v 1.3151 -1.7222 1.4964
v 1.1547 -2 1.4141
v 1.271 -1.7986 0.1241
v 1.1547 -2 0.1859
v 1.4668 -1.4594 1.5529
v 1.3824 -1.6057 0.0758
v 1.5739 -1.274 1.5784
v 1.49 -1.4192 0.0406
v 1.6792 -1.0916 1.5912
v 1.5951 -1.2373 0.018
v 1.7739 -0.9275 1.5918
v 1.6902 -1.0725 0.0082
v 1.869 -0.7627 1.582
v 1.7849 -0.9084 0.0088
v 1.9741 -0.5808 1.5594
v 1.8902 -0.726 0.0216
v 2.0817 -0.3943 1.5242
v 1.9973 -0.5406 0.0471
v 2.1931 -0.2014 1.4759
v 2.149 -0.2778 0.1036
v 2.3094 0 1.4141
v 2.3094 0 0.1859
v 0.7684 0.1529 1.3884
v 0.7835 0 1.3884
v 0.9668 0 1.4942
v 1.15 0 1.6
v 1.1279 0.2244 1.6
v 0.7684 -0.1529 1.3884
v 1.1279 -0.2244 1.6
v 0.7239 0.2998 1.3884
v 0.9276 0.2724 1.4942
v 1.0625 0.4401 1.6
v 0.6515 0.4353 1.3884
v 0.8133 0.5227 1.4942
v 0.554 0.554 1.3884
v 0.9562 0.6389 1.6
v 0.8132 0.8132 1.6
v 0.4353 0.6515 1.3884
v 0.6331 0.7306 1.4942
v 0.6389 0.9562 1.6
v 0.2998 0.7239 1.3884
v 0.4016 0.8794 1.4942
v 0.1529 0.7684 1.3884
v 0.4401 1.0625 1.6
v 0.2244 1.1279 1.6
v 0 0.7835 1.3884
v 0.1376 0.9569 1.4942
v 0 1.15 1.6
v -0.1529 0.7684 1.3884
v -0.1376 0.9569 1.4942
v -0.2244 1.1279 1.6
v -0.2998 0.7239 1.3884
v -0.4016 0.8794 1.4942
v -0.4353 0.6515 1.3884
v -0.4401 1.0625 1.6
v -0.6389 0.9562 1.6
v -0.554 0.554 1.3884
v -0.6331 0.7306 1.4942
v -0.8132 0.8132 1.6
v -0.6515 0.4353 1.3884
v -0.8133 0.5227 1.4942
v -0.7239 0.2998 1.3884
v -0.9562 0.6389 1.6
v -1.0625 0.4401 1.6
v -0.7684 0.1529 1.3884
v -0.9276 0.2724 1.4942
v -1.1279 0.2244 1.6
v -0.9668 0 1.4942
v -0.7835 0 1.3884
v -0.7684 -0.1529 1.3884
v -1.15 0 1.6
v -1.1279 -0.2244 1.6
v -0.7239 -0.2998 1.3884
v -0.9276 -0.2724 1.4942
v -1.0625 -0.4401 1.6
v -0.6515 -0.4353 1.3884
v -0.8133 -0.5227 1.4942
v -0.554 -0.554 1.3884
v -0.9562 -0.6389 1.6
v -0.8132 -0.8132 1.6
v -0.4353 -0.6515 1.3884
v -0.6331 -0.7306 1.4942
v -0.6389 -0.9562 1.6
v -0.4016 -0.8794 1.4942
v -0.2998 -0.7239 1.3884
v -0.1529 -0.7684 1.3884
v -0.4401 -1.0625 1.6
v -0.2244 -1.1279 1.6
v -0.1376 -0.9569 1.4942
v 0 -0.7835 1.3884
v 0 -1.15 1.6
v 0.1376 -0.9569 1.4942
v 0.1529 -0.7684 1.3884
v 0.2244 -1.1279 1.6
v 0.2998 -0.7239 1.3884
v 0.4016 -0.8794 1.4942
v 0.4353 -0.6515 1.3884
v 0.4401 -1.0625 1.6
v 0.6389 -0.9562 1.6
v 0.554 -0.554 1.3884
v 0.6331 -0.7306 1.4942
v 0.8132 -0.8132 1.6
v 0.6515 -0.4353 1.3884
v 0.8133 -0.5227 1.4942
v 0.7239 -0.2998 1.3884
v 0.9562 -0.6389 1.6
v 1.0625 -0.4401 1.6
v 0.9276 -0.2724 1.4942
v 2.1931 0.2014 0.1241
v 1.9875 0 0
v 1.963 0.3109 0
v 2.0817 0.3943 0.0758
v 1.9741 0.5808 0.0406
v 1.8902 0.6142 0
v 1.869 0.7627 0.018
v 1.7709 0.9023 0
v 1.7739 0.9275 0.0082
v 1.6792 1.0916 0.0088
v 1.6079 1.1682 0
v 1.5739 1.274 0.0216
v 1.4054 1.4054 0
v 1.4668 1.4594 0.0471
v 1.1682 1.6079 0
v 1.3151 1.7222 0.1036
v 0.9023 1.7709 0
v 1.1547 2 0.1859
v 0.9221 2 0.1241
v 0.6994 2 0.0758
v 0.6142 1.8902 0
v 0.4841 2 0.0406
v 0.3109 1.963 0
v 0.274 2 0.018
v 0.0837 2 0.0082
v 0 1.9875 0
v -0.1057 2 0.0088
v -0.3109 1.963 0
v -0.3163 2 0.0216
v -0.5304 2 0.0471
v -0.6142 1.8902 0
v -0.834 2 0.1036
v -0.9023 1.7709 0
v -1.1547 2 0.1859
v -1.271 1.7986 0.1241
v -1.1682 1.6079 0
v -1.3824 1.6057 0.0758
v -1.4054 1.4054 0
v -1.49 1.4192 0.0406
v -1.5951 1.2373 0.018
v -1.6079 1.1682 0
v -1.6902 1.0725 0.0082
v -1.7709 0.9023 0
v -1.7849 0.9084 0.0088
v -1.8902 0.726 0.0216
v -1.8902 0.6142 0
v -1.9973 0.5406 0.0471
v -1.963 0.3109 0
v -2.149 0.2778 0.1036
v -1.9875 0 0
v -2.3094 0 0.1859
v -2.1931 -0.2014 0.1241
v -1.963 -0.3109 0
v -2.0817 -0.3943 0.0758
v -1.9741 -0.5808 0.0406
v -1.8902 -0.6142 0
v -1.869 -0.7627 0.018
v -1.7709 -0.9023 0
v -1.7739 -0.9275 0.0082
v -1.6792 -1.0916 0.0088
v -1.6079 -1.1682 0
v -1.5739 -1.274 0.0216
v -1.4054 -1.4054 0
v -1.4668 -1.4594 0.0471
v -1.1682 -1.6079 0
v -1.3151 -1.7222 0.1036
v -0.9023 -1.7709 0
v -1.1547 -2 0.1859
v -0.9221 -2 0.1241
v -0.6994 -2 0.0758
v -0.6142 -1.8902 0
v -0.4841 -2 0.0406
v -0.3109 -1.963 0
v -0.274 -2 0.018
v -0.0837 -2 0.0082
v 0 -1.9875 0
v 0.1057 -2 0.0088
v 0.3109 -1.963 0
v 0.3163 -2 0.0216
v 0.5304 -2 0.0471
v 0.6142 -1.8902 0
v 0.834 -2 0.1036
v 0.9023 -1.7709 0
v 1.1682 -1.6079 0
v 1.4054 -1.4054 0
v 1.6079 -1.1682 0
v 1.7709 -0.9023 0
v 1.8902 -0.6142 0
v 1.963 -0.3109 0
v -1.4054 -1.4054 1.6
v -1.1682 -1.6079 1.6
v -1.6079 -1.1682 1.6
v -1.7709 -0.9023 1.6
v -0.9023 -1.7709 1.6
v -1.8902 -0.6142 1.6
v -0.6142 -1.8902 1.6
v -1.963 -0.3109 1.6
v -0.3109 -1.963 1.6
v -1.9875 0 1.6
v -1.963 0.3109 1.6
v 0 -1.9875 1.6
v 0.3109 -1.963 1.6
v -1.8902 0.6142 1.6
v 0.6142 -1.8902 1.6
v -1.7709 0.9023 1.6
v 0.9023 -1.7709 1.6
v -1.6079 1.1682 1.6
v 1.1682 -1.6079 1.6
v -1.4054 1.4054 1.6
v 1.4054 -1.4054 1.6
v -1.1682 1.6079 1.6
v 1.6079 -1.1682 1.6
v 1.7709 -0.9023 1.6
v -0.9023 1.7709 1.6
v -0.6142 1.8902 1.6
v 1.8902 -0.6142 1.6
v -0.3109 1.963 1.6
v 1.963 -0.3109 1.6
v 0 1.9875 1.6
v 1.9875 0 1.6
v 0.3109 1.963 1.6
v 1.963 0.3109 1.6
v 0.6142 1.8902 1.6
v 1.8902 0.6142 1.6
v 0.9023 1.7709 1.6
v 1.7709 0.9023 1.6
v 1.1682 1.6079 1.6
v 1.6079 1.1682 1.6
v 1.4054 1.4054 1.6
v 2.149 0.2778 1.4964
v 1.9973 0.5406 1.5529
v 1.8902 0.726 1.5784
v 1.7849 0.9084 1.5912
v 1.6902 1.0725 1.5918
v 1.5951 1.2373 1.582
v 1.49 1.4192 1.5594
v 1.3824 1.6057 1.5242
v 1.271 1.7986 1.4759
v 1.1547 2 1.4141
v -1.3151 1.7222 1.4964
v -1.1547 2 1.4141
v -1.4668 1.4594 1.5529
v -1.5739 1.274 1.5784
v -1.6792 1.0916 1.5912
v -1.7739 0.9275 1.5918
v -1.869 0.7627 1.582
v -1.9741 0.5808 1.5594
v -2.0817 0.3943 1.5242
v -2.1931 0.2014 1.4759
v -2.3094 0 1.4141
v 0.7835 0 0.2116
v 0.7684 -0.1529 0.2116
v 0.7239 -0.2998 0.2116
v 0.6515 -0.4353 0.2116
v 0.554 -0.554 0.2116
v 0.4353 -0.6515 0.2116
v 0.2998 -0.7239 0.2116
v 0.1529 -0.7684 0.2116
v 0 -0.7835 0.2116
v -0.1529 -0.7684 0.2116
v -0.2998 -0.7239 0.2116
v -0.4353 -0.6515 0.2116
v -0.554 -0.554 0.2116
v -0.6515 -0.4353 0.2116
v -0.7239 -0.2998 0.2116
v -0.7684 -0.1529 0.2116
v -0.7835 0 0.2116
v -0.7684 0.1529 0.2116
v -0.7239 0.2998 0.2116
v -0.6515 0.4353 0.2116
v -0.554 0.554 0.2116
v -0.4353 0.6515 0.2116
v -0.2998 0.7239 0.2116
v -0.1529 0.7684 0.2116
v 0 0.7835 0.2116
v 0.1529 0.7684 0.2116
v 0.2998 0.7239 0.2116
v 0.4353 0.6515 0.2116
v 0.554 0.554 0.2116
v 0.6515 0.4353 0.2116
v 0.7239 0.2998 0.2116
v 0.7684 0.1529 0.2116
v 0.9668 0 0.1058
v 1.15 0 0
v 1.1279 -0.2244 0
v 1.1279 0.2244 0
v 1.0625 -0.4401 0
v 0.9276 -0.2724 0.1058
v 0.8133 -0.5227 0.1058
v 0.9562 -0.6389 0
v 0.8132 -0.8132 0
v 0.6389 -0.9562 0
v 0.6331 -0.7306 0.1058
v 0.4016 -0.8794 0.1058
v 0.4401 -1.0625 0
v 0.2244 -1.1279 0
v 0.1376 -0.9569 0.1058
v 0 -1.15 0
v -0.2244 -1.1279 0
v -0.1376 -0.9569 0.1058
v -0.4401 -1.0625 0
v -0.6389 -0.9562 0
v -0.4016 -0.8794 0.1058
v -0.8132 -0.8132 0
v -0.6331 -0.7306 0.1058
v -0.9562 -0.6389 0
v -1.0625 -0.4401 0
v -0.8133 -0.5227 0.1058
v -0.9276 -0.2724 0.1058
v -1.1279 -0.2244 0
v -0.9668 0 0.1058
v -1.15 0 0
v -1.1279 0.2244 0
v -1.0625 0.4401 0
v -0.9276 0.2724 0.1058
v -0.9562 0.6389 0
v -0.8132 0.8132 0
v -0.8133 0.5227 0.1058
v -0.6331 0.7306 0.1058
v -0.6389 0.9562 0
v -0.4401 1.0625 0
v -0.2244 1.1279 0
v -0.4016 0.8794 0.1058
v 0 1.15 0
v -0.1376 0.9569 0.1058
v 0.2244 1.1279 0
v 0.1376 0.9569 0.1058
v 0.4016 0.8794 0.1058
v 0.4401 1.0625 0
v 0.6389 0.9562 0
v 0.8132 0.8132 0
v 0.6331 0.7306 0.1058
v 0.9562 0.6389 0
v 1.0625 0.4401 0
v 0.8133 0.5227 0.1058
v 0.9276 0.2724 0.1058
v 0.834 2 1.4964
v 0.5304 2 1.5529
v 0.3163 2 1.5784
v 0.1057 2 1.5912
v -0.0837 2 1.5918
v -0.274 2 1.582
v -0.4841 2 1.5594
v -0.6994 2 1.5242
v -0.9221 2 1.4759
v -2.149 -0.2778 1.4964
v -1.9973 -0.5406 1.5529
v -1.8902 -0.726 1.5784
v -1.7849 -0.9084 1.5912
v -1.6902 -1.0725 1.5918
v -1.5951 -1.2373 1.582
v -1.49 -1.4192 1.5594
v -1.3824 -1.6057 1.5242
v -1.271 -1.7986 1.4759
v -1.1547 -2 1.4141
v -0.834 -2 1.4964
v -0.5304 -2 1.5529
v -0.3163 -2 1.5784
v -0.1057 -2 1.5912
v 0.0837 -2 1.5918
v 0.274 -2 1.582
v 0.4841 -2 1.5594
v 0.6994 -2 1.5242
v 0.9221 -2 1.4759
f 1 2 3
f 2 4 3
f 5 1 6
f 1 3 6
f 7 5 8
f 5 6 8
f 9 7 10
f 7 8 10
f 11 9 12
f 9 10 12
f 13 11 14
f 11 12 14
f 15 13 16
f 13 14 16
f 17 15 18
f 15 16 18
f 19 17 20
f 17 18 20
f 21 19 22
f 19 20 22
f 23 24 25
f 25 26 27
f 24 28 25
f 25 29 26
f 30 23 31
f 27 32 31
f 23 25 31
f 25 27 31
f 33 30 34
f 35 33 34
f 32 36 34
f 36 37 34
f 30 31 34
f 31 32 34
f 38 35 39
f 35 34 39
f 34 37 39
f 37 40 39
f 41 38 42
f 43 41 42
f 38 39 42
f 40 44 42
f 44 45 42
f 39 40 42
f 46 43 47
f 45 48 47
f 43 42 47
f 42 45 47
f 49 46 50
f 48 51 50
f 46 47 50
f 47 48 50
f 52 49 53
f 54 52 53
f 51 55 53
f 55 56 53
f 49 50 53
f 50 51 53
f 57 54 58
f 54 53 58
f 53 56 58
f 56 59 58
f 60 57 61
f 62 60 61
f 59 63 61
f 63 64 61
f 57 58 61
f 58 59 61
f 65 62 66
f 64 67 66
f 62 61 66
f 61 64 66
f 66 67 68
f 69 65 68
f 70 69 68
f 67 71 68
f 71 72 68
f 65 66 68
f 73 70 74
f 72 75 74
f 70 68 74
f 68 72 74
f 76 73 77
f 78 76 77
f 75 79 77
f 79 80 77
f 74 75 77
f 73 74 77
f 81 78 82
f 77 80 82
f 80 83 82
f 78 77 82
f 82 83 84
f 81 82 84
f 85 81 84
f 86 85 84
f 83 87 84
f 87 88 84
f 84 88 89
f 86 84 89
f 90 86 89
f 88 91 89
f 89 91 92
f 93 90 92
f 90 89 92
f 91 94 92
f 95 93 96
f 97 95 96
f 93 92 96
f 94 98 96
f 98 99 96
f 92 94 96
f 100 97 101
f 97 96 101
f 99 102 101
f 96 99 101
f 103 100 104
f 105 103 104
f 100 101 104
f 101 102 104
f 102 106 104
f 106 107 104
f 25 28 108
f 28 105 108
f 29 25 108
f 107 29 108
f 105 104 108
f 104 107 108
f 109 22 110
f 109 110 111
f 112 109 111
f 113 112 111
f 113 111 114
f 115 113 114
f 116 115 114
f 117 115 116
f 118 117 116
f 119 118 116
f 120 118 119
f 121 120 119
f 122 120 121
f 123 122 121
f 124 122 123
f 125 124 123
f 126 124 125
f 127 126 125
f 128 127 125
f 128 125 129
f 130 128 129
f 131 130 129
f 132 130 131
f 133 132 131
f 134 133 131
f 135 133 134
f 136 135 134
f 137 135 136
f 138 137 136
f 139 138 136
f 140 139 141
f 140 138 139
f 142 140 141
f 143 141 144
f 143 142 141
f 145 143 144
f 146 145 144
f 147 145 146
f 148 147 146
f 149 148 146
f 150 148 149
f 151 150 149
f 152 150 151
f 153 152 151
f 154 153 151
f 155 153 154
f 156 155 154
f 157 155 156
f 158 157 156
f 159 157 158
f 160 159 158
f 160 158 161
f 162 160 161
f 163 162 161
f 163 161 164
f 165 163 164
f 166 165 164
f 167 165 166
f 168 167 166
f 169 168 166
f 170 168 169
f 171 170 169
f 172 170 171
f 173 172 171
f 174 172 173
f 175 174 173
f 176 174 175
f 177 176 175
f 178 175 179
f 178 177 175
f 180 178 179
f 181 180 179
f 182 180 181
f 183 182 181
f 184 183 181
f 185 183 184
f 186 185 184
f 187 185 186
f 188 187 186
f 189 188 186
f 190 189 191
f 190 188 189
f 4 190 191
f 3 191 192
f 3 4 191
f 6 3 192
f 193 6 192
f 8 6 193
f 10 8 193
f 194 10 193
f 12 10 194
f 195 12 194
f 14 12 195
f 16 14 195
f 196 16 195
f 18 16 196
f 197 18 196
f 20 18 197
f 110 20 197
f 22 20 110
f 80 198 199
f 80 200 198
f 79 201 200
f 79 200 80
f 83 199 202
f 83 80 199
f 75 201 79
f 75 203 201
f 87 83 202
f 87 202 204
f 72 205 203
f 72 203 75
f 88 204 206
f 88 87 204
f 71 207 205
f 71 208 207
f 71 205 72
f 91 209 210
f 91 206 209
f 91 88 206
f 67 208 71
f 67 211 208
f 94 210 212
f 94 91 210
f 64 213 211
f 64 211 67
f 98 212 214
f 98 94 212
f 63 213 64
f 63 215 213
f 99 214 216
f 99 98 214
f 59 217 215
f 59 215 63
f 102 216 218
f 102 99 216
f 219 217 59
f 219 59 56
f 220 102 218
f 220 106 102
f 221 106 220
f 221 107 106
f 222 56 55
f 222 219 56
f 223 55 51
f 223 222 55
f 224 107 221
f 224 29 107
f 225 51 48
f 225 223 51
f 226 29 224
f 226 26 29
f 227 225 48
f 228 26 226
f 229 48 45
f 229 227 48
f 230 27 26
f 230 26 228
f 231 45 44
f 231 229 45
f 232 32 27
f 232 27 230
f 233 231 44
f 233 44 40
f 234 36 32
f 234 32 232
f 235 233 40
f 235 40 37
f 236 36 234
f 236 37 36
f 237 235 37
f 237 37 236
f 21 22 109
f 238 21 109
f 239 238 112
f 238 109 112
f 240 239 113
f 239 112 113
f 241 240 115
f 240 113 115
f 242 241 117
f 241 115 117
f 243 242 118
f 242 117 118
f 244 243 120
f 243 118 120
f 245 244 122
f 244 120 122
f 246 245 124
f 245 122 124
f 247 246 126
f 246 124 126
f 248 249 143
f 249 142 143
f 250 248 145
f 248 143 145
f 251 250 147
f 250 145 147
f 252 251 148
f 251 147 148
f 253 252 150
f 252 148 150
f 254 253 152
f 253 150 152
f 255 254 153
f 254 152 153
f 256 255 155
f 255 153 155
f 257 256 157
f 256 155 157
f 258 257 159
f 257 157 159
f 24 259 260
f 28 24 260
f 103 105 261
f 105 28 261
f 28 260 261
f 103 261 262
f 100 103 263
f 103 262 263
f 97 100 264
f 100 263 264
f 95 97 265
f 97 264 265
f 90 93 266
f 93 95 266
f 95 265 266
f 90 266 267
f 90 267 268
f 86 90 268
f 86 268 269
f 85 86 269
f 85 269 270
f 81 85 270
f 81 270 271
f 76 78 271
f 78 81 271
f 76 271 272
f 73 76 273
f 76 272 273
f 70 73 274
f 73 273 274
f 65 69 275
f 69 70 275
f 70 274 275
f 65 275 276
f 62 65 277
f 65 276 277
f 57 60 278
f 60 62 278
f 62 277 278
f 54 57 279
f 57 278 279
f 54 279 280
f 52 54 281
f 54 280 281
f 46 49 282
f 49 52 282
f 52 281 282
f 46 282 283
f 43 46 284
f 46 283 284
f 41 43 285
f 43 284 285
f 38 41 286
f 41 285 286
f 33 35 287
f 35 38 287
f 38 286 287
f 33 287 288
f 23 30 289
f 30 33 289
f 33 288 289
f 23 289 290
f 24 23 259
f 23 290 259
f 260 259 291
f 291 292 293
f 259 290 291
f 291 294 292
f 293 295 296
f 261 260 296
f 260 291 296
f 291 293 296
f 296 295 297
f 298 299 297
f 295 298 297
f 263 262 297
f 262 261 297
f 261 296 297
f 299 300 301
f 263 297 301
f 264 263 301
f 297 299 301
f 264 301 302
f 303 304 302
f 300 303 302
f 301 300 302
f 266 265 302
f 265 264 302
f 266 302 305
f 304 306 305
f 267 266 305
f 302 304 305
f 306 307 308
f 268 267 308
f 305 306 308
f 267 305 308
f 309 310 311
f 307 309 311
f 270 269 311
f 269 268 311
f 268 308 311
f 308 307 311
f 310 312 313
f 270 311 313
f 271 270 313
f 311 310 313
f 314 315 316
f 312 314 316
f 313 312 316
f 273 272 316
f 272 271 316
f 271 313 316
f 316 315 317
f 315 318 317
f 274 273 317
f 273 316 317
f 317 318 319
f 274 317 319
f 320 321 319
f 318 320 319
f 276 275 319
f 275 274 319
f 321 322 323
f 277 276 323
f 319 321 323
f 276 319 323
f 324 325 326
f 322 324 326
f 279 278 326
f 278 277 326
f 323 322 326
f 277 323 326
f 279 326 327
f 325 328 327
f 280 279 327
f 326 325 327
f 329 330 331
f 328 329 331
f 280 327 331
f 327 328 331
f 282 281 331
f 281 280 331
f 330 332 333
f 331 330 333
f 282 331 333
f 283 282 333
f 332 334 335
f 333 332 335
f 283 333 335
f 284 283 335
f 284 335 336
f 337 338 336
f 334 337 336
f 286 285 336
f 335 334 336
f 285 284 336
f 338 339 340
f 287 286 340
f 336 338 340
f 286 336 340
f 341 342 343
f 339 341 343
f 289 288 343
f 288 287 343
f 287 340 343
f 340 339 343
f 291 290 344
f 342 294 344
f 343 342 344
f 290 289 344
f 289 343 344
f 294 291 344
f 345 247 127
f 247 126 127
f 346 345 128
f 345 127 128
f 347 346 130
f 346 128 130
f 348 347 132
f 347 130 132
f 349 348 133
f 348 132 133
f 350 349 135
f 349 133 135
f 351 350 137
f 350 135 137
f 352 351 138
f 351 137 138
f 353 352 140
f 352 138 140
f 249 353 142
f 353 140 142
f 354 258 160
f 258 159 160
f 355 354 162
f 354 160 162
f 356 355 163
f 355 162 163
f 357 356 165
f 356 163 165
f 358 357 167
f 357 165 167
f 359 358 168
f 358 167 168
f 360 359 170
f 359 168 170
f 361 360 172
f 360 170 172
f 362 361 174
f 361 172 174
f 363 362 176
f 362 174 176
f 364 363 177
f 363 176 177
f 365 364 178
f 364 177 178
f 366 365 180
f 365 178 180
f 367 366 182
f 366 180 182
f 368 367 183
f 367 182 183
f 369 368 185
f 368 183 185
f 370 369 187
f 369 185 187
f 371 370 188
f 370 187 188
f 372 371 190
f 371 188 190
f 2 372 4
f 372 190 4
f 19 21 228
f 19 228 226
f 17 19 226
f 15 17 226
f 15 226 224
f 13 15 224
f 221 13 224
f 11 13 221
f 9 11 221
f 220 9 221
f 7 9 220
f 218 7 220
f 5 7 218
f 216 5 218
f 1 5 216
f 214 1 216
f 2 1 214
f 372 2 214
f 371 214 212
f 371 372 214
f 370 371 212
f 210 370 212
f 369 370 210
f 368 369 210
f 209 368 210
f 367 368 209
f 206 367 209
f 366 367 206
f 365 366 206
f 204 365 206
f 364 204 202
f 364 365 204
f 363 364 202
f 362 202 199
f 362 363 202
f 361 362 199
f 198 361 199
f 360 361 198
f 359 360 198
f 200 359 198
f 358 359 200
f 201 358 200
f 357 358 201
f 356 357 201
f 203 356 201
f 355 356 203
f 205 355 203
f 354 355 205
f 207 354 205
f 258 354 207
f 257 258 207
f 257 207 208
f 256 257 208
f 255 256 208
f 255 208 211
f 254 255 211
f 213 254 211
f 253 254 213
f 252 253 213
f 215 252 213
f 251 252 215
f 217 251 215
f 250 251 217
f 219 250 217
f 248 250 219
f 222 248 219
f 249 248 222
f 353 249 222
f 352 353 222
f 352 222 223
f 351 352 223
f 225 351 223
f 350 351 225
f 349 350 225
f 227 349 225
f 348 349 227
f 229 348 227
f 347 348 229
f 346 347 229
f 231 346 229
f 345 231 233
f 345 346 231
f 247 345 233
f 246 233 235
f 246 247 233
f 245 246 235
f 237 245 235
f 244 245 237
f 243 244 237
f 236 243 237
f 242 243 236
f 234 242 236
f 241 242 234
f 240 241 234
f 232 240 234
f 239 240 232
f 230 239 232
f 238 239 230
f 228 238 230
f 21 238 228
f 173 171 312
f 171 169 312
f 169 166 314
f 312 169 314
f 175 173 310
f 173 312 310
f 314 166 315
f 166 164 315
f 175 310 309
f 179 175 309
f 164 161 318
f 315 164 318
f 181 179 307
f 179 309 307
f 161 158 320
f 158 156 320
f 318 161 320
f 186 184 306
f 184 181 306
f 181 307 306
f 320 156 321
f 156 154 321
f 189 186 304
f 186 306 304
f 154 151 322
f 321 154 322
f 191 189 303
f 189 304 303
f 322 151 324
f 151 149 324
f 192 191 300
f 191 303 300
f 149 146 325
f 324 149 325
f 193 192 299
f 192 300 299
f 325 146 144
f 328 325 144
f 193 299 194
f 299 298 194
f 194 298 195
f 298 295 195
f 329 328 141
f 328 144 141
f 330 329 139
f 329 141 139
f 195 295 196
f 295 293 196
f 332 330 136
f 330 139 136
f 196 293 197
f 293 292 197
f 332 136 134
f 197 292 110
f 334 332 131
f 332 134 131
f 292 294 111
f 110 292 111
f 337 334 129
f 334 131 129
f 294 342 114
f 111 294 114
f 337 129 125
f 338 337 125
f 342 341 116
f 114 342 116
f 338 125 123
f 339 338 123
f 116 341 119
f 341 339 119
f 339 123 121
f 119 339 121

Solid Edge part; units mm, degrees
sketch "Sketch1" plane through (0, 0, 0) normal (0, 0, 1) x (1, 0, 0)
  circle A0 centre (0, 0) radius 0.7835
  circle A1 centre (0, 0) radius 2.3094
  dimension "D1" = 2
  dimension "D2" = 1.567
extrude "Protrusion1" add sketch "Sketch1" along normal blind 1.6
sketch "Sketch2" plane through (0, 0, 0) normal (0, 0, 1) x (1, 0, 0)
  line L0 (2.3094, 0) -> (1.1547, 2)
  arc A0 (1.1547, 2) -> (2.3094, 0) centre (0, 0) cw
  dimension "D1" = 2
extrude "ExtrudedCutout_1" cut sketch "Sketch2" along normal blind 1.6
pattern_circular "Pattern1" count 6 over 360 about axis through (0, 0, 0) along (0, 0, -1) of "ExtrudedCutout_1"
cosmetic_thread "Thread_1" size "M2" thread depth 1.6
sketch "Sketch3" plane through (0, 0, 0) normal (0, -1, 0) x (1, 0, 0)
  line L0 (2.3094, 0.1859) -> (1.9875, 0)
  line L1 (1.9875, 0) -> (2.3094, 0)
  line L2 (2.3094, 0) -> (2.3094, 0.1859)
  line L3 (1.9875, 1.6) -> (2.3094, 1.6)
  line L4 (2.3094, 1.6) -> (2.3094, 1.4141)
  line L5 (2.3094, 1.4141) -> (1.9875, 1.6)
  dimension "D1" = 1.6
  dimension "D2" = 1.9875
  dimension "D3" = 2.3094
revolve "RevolvedCutout_1" cut sketch "Sketch3" angle 360 about axis through (0, 0, 8.4) along (0, 0, -1)
chamfer "Chamfer_1" distance 0.3665 angle 30 1 edges at (-0.7835, 0, 0) measured on face at (-1.3648, -1.2852, 0)
chamfer "Chamfer_2" distance 0.3665 angle 30 1 edges at (-0.7835, 0, 1.6) measured on face at (-1.3648, -1.2852, 1.6)
properties material "Steel"
